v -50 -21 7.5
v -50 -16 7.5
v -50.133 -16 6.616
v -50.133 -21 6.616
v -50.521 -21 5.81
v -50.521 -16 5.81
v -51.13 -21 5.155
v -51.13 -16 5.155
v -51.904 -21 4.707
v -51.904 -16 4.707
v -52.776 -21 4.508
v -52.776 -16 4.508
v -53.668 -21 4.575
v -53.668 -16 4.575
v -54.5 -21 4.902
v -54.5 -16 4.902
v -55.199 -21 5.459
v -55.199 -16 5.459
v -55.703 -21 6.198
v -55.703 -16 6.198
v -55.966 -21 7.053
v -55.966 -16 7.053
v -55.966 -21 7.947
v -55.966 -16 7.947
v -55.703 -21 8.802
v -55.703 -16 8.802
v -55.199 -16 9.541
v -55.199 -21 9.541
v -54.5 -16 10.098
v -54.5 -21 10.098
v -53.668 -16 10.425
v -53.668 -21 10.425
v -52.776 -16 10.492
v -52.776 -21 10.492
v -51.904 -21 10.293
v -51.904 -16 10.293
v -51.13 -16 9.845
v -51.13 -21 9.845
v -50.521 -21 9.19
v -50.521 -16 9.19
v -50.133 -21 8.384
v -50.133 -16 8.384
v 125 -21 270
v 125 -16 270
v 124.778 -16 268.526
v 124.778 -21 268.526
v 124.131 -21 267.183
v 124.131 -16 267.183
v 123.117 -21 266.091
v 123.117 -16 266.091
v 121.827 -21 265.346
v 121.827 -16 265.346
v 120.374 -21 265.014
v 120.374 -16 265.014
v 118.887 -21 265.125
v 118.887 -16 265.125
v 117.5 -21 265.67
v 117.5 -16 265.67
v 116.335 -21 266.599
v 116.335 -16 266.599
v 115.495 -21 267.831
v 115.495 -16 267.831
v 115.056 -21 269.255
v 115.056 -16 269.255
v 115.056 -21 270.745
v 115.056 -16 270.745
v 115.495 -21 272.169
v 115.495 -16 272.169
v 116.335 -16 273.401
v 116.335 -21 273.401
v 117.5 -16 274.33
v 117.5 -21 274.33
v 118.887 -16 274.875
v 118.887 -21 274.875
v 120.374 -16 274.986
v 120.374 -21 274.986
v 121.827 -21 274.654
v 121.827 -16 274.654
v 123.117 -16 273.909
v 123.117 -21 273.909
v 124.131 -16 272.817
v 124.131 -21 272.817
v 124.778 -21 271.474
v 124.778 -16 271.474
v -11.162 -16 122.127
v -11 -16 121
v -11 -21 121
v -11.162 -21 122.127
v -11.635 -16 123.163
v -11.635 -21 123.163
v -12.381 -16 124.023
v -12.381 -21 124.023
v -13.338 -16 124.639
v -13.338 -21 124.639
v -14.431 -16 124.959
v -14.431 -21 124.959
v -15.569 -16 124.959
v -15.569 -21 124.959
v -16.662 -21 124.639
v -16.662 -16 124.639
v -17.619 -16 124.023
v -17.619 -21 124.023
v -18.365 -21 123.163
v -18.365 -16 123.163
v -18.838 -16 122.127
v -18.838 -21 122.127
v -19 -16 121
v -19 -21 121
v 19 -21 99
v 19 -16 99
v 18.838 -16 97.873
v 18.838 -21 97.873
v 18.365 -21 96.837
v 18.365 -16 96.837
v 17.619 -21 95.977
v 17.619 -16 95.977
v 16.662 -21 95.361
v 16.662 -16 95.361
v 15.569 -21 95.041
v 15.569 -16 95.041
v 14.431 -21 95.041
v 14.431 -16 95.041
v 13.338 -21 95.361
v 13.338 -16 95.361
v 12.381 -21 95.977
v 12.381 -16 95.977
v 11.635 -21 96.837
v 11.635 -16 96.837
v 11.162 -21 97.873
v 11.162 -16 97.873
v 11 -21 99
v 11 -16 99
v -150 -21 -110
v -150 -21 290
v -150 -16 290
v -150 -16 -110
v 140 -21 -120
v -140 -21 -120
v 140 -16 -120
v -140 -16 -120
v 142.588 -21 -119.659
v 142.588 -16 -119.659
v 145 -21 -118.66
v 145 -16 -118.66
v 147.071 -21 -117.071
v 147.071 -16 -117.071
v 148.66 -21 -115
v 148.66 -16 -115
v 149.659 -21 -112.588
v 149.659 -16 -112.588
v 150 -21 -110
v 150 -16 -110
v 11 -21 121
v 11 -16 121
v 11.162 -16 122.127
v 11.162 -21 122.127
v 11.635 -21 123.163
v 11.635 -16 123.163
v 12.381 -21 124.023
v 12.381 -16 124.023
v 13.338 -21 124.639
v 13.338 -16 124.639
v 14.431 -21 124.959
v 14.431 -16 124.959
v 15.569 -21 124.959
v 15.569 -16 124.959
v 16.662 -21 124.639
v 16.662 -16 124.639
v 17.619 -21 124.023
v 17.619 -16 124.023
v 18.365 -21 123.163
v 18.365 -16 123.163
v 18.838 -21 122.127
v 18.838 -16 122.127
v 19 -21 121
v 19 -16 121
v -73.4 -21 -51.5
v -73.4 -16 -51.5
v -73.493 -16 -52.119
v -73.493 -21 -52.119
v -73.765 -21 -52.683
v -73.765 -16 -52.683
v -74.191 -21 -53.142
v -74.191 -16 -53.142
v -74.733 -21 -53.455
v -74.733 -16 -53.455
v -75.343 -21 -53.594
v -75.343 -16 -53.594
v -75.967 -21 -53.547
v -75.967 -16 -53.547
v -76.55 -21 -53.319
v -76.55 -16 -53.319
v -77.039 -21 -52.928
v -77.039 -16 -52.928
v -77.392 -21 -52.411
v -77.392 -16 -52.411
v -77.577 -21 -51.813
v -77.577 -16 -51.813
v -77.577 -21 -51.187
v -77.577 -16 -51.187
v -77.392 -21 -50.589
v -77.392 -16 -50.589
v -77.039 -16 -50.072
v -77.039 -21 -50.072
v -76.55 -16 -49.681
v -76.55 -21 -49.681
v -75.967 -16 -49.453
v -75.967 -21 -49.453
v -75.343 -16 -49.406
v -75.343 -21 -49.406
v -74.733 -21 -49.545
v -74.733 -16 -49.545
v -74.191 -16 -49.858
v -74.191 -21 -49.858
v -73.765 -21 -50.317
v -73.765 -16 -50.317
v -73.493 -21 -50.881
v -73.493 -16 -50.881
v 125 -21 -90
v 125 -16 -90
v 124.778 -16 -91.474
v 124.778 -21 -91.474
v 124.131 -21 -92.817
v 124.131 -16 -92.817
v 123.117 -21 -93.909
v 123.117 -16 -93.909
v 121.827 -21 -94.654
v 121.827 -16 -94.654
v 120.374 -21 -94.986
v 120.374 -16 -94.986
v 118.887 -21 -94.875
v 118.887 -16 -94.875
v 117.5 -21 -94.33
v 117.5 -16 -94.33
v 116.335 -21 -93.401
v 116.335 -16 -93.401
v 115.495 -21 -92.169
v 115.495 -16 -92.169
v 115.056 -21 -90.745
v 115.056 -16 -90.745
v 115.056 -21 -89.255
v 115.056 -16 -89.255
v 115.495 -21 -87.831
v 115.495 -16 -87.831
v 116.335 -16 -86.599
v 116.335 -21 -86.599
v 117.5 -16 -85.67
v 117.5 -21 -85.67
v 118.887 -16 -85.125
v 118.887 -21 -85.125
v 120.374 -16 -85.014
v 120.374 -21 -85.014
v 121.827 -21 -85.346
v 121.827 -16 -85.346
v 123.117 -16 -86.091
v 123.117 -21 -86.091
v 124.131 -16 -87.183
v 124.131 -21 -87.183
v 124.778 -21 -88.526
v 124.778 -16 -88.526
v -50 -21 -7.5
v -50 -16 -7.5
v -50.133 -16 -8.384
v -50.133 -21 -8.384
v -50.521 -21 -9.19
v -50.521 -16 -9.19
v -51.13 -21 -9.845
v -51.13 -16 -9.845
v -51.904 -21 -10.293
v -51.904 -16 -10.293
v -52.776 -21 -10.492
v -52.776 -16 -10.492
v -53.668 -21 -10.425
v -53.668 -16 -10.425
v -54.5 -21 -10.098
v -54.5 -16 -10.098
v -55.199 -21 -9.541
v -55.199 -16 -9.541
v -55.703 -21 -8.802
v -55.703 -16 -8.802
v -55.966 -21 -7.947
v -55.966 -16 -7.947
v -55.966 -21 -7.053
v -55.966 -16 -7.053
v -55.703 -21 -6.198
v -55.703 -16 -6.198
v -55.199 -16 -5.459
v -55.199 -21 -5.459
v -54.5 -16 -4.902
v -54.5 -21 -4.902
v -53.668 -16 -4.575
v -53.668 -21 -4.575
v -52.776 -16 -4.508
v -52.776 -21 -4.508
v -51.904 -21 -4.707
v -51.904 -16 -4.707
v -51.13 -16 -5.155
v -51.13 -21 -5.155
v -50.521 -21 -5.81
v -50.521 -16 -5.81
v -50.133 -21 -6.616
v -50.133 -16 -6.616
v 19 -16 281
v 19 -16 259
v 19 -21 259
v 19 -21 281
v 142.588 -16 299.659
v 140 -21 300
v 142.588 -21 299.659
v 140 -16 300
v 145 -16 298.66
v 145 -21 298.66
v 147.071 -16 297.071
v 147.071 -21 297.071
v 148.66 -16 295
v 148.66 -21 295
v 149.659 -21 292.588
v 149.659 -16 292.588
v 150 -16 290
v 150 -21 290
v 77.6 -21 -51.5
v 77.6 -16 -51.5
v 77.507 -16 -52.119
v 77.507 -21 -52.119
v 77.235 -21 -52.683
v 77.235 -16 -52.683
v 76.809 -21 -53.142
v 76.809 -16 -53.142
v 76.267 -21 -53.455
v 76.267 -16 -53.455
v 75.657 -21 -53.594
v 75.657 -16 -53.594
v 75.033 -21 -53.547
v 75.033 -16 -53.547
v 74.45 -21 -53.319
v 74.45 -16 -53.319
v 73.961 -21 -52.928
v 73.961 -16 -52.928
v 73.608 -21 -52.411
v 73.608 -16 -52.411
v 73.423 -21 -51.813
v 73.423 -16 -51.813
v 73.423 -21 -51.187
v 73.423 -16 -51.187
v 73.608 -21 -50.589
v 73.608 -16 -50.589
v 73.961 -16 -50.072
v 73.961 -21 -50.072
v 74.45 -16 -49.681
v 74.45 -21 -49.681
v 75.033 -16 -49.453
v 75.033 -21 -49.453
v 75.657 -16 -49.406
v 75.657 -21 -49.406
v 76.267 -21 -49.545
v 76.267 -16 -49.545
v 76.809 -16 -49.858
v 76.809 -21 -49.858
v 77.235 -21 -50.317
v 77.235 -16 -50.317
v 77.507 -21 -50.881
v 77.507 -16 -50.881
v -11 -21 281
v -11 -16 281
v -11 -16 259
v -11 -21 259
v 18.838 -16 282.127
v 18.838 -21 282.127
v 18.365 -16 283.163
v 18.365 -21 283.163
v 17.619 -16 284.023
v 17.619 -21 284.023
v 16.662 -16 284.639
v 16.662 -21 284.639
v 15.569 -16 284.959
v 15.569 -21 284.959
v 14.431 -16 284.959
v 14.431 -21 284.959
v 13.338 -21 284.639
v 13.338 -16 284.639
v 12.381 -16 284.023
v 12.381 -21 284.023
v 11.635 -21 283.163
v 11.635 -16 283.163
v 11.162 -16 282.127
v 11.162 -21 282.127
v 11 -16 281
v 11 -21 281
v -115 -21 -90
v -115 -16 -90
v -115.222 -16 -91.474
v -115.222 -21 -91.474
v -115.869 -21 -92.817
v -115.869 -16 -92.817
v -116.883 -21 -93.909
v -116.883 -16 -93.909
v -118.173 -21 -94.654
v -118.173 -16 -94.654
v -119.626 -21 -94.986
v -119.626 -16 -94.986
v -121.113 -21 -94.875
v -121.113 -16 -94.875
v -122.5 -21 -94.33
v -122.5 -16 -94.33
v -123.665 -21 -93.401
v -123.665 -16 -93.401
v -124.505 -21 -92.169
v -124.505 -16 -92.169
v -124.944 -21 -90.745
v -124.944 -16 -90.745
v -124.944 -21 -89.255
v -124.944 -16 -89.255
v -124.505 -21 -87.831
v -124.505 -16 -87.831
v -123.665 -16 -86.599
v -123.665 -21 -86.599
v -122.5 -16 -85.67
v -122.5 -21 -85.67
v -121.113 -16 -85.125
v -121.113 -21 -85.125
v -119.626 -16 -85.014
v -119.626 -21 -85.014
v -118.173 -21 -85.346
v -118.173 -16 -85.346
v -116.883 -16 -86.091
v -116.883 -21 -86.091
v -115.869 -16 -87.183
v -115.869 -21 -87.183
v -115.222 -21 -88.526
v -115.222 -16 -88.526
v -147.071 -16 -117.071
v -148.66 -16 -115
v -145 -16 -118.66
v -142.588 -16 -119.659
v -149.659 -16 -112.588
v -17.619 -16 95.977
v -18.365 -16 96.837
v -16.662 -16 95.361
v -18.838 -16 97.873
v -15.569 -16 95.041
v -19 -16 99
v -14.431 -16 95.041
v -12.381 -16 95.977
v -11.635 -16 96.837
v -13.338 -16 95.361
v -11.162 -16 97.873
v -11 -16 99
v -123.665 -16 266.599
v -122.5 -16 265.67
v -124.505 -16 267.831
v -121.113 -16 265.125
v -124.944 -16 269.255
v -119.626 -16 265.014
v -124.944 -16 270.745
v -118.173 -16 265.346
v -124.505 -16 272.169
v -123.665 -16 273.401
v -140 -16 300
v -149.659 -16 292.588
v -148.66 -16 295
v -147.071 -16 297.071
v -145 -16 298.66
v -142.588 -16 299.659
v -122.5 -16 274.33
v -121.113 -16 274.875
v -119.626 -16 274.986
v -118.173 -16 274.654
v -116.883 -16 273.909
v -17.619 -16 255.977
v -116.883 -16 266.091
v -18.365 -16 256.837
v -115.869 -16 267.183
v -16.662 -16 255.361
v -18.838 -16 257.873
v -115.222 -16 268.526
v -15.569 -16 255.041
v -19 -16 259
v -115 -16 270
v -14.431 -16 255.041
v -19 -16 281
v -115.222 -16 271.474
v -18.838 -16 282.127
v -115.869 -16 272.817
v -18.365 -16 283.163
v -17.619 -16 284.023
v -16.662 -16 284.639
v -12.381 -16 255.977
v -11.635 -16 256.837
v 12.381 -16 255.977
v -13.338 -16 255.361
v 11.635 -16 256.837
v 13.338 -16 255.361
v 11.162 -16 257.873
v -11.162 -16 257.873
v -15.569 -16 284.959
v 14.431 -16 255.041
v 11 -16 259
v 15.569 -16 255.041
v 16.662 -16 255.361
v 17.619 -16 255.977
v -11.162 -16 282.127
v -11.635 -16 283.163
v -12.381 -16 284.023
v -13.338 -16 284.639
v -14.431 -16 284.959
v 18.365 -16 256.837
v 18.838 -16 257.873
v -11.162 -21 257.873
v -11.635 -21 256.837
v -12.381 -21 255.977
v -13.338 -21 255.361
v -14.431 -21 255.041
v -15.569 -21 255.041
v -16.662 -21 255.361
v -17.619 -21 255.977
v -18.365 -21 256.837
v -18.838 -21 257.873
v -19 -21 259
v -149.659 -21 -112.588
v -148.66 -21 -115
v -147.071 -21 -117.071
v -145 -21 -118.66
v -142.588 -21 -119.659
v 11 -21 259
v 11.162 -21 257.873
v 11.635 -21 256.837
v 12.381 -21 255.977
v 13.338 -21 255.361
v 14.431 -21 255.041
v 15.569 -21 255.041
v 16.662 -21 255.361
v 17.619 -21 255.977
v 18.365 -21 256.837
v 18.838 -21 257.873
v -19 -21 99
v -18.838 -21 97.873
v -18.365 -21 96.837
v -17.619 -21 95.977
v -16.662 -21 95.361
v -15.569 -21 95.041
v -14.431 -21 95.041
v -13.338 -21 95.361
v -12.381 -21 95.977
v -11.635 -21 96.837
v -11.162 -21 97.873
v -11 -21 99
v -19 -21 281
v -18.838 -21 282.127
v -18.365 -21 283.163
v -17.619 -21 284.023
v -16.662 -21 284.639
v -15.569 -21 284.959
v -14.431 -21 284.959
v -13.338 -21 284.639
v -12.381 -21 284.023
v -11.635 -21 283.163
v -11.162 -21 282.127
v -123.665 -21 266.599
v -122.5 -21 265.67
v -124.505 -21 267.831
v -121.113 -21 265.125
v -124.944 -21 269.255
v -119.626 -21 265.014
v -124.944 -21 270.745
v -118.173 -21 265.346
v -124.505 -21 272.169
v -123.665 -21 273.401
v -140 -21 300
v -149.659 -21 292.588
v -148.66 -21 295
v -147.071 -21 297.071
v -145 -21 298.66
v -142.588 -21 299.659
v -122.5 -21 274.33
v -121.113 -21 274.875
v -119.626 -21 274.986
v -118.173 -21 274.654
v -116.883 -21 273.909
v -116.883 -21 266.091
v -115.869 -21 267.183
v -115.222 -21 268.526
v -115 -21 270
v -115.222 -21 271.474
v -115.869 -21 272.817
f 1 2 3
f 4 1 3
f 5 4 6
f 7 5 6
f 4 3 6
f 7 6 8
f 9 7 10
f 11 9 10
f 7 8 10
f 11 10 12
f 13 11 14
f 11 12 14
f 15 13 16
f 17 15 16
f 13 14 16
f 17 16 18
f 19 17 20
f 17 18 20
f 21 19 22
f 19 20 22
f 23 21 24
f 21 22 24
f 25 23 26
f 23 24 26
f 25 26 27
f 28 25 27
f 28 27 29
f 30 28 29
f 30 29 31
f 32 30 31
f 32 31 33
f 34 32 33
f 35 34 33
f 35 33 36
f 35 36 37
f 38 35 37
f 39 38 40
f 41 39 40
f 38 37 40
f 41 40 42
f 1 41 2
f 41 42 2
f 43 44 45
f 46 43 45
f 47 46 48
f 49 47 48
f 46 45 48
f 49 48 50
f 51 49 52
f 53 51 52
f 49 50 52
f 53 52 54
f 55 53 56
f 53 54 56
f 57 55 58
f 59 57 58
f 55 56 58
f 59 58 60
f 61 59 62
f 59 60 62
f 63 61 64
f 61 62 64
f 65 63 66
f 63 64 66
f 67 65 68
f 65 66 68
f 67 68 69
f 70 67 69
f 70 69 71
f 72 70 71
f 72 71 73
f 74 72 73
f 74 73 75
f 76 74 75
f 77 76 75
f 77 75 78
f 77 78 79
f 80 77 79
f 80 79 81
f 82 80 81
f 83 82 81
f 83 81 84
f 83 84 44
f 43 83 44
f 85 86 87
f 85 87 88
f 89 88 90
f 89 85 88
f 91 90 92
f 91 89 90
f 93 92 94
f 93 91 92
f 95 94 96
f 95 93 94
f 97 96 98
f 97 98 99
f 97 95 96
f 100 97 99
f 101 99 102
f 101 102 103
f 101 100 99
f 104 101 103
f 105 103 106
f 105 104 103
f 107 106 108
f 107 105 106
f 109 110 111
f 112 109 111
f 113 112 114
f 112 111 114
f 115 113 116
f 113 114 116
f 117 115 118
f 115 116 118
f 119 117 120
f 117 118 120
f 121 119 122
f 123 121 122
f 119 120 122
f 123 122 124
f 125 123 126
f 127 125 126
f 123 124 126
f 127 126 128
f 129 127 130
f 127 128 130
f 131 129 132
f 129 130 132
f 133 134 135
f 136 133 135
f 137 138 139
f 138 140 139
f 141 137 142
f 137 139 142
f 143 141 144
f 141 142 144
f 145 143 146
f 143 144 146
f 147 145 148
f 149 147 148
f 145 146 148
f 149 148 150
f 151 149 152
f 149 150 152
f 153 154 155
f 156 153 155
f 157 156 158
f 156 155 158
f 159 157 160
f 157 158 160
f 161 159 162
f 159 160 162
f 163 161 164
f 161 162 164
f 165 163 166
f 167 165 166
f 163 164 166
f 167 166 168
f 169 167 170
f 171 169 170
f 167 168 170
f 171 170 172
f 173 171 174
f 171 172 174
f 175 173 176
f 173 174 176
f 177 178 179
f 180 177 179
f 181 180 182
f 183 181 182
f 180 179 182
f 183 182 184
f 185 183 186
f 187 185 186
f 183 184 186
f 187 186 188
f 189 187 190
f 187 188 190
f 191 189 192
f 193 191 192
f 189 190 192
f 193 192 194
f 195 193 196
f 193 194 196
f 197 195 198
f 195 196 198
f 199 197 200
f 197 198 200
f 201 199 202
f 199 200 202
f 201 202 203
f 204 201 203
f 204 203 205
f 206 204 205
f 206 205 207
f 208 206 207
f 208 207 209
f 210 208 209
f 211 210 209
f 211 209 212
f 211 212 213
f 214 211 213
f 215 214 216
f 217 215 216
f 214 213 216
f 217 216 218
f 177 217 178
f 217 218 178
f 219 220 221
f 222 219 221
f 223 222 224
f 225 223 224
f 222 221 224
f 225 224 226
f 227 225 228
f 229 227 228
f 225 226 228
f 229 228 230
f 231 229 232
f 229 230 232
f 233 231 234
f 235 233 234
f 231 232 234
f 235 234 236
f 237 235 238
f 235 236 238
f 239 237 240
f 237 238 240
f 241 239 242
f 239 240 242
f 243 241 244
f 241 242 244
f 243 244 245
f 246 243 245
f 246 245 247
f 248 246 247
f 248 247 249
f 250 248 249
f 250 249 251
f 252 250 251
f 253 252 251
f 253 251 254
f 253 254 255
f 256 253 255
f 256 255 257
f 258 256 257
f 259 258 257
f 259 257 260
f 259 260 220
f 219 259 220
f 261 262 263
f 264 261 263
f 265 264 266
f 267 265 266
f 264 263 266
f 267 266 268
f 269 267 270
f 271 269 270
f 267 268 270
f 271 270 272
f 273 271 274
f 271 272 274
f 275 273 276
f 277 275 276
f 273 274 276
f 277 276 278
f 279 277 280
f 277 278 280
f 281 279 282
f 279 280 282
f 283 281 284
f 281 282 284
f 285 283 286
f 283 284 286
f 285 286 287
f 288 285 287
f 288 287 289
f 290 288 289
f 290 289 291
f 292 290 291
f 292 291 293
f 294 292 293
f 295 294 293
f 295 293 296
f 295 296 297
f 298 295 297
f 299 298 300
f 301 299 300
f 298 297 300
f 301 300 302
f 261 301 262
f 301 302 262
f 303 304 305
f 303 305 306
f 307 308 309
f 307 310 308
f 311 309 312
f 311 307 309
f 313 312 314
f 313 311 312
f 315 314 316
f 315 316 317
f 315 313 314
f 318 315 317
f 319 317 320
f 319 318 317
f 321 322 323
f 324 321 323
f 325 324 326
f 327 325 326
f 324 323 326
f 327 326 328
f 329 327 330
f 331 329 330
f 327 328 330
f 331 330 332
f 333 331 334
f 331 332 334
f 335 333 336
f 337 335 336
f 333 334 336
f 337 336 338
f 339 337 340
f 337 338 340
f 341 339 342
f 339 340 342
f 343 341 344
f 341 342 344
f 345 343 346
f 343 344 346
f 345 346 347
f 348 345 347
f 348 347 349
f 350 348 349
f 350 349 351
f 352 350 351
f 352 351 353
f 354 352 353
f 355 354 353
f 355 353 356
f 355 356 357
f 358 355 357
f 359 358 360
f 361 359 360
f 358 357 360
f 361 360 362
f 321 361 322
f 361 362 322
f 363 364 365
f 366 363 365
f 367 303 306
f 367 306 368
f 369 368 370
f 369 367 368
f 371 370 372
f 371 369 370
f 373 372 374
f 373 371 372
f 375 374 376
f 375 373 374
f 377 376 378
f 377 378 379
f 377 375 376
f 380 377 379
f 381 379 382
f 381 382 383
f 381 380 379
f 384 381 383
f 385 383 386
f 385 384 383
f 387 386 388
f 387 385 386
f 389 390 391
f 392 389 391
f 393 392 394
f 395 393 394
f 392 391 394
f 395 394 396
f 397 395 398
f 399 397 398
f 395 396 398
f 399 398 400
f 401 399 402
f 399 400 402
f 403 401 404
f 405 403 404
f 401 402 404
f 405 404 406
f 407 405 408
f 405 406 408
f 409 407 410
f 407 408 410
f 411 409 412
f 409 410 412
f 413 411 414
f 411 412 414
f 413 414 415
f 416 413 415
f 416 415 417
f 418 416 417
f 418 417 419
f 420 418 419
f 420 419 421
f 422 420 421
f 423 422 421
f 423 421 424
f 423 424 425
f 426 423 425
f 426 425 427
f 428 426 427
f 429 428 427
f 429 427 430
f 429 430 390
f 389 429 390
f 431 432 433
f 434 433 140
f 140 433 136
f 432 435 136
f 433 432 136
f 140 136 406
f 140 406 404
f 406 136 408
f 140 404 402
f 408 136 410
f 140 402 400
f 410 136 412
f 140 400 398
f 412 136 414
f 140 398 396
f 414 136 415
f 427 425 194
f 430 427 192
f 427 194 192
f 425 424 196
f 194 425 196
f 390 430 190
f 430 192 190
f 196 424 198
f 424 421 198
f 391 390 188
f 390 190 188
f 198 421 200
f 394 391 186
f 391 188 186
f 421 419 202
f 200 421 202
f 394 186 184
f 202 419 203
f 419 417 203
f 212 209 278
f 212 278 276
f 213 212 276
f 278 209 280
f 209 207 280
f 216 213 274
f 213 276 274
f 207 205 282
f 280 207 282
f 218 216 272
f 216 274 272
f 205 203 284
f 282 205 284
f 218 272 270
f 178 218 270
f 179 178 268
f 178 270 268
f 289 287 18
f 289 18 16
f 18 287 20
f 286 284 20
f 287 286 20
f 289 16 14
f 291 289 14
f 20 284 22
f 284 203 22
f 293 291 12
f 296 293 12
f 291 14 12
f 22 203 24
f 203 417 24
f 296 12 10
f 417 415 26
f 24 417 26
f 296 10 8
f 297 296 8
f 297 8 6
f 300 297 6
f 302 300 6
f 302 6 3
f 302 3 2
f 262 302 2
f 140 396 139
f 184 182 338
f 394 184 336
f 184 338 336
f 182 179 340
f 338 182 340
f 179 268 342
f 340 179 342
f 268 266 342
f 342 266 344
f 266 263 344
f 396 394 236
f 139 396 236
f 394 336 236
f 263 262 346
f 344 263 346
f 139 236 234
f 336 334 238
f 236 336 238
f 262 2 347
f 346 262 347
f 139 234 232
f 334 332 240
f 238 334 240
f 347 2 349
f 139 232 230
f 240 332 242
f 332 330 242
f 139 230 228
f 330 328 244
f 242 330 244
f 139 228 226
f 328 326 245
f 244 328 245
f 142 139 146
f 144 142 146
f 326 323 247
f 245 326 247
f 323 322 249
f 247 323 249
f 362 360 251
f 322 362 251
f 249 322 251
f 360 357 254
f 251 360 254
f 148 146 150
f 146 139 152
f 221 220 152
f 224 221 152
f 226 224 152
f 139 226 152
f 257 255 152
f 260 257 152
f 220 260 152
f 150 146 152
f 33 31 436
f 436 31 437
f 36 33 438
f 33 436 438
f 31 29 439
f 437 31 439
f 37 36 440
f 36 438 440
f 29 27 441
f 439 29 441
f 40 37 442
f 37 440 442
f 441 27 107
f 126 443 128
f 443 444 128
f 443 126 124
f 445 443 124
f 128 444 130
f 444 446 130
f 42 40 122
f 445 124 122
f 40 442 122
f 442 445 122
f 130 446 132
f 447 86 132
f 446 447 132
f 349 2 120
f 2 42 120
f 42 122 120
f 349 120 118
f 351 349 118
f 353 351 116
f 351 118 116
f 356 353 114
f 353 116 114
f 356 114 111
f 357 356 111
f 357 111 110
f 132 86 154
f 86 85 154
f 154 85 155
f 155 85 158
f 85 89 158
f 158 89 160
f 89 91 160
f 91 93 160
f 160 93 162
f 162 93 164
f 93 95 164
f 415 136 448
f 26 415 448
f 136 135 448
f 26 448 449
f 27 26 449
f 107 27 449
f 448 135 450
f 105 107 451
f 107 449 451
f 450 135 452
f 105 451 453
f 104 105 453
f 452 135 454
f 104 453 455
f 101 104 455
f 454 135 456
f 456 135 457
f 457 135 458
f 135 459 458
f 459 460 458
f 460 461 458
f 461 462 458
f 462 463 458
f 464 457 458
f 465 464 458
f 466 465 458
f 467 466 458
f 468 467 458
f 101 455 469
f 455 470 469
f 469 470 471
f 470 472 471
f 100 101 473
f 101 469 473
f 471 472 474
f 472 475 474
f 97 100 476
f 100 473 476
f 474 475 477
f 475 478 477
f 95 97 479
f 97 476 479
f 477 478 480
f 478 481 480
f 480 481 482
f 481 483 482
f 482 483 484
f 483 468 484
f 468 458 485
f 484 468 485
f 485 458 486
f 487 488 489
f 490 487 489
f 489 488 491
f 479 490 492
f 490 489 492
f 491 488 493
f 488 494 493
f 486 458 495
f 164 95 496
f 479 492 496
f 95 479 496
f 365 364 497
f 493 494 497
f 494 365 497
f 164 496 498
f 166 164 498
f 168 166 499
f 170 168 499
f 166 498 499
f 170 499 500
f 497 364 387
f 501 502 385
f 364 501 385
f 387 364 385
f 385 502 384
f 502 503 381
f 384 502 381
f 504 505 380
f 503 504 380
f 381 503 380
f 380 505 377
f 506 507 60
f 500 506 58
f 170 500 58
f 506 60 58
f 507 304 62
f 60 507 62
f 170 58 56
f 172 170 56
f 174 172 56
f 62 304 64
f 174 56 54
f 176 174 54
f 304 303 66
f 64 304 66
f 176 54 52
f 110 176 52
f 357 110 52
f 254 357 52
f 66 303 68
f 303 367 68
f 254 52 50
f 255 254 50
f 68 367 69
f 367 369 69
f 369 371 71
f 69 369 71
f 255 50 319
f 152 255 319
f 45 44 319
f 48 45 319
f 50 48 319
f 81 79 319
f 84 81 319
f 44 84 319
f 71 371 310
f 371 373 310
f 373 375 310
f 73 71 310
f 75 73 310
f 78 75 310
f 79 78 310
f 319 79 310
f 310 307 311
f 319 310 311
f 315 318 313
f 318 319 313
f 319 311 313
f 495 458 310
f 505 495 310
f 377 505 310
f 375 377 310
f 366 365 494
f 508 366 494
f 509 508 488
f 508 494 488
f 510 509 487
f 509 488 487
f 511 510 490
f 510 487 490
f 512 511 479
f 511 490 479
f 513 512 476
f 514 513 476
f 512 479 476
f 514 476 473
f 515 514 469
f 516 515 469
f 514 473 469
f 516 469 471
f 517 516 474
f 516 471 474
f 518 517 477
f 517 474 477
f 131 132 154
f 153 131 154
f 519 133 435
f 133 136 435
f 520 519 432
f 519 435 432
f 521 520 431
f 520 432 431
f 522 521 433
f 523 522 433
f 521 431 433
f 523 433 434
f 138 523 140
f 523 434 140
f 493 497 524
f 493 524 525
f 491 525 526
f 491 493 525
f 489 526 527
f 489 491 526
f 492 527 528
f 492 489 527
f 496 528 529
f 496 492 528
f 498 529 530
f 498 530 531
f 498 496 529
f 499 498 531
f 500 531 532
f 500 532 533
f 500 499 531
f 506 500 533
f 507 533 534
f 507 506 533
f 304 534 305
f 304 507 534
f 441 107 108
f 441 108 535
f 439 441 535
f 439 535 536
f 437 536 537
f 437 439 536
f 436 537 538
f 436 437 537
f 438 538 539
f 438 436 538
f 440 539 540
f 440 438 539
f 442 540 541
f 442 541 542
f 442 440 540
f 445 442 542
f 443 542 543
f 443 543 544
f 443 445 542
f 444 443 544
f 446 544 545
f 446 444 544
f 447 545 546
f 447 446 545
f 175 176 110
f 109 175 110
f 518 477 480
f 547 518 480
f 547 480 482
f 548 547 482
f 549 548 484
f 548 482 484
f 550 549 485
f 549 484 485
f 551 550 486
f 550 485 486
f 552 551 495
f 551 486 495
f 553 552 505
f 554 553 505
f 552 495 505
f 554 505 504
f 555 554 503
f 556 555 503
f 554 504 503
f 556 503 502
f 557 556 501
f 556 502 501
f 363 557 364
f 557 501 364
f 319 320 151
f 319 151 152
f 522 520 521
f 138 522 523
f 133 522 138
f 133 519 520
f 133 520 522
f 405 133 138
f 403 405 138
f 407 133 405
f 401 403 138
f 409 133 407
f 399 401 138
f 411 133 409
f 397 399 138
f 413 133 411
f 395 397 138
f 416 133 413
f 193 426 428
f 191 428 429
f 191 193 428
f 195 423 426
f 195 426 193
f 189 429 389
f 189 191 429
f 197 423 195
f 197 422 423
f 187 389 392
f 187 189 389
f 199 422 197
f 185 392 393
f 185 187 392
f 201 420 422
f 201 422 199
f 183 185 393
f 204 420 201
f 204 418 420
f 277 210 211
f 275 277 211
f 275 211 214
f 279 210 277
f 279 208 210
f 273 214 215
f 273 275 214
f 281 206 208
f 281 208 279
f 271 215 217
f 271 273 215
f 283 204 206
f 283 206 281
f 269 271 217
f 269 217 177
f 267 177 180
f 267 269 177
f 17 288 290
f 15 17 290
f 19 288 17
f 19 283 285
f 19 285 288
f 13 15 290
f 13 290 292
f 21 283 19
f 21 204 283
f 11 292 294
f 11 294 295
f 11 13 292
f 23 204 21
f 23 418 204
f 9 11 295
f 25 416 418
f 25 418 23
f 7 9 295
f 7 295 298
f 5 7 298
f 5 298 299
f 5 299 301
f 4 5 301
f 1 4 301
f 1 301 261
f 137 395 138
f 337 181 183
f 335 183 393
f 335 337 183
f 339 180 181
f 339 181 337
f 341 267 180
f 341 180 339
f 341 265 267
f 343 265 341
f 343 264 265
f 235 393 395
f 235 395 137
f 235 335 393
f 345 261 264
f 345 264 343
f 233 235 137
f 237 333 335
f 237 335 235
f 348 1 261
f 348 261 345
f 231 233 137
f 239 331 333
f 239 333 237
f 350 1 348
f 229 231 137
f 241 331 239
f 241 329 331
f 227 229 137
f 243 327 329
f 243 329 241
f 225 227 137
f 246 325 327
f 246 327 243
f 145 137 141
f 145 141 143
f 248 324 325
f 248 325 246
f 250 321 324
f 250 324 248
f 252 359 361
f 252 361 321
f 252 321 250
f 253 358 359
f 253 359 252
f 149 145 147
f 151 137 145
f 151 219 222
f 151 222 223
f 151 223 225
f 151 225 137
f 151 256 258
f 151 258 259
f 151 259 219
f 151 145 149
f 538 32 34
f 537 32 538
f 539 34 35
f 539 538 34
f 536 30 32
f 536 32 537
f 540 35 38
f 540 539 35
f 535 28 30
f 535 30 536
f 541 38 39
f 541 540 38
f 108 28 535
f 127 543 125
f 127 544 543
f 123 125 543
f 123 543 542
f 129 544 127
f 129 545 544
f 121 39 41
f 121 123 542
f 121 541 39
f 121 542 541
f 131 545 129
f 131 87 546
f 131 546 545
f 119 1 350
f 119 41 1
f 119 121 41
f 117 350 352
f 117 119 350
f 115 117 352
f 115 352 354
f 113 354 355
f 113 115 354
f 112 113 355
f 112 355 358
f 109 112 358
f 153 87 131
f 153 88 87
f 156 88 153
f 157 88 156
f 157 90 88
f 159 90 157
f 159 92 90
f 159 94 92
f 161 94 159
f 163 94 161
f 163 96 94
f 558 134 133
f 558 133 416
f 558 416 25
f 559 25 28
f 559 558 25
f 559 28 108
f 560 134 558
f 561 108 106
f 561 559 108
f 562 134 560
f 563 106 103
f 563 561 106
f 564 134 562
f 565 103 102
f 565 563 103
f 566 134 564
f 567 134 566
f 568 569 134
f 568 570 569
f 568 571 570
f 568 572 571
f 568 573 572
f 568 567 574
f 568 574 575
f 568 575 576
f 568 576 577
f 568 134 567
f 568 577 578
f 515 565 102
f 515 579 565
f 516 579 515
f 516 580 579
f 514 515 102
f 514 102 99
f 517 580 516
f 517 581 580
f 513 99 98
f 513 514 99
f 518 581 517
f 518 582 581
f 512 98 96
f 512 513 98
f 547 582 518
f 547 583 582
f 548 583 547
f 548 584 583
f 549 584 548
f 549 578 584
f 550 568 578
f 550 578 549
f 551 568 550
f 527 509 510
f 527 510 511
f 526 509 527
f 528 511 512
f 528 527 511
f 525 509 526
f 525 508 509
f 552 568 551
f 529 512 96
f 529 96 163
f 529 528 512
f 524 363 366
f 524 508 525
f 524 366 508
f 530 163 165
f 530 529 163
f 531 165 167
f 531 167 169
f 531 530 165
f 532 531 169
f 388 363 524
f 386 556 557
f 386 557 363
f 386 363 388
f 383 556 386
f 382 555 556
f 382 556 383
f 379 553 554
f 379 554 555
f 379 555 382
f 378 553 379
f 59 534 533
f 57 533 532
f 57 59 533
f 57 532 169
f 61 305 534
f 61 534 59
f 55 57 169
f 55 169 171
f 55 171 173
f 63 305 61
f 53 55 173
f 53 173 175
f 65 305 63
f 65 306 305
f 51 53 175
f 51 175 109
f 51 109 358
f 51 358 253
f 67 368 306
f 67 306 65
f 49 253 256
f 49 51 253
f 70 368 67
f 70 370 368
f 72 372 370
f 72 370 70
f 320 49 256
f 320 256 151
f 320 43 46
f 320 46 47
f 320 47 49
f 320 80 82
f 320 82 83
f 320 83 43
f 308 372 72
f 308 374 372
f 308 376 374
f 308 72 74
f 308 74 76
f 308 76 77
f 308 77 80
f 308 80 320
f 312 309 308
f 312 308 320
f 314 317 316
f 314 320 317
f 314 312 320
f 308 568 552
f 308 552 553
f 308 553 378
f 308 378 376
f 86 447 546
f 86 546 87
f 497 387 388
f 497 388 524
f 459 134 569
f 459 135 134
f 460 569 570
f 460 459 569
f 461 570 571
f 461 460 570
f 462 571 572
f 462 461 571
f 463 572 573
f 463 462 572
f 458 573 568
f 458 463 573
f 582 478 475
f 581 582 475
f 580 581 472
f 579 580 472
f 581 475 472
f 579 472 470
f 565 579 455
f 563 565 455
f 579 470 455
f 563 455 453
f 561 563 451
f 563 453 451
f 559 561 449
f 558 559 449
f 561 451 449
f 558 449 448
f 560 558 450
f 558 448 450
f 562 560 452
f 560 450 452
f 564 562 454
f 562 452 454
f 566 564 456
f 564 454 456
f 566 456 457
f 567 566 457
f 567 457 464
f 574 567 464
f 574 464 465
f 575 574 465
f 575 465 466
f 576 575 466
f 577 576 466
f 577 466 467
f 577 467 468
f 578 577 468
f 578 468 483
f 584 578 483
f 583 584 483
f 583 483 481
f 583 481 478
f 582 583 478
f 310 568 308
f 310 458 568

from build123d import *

# Parameters (mm, degrees)
SKIZZE2_W                            = 300
SKIZZE2_H                            = 5
AUFSATZ_LINEAR_AUSTRAGEN1_DEPTH      = 300
AUFSATZ_LINEAR_AUSTRAGEN1_DEPTH_BACK = 120
SCHNITT_LINEAR_AUSTRAGEN1_DEPTH      = 5
SKIZZE6_R                            = 3
SCHNITT_LINEAR_AUSTRAGEN2_DEPTH      = 5
SKIZZE8_R                            = 5
SCHNITT_LINEAR_AUSTRAGEN3_DEPTH      = 21
VERRUNDUNG1_R                        = 10
SKIZZE9_R                            = 2.1
SCHNITT_LINEAR_AUSTRAGEN4_DEPTH      = 5


with BuildPart() as part:
    # Skizze2 → Aufsatz-Linear austragen1 (new body, two sides)
    with BuildSketch(Plane.XY) as aufsatz_linear_austragen1_sk:
        with Locations((0, -18.5)):
            Rectangle(SKIZZE2_W, SKIZZE2_H)
    extrude(amount=AUFSATZ_LINEAR_AUSTRAGEN1_DEPTH)
    extrude(aufsatz_linear_austragen1_sk.sketch, amount=-AUFSATZ_LINEAR_AUSTRAGEN1_DEPTH_BACK)

    # Skizze4 → Schnitt-Linear austragen1 (cut)
    with BuildSketch(Plane(origin=(0, -16, 0), x_dir=(1, 0, 0), z_dir=(0, 1, 0))):
        with BuildLine():
            Line((-19, -121), (-19, -99))
            ThreePointArc((-19, -99), (-15, -95), (-11, -99))
            Line((-11, -99), (-11, -121))
            ThreePointArc((-11, -121), (-15, -125), (-19, -121))
        make_face()
        with BuildLine():
            Line((19, -121), (19, -99))
            ThreePointArc((19, -99), (15, -95), (11, -99))
            Line((11, -99), (11, -121))
            ThreePointArc((11, -121), (15, -125), (19, -121))
        make_face()
        with BuildLine():
            Line((-19, -259), (-19, -281))
            ThreePointArc((-19, -281), (-15, -285), (-11, -281))
            Line((-11, -281), (-11, -259))
            ThreePointArc((-11, -259), (-15, -255), (-19, -259))
        make_face()
        with BuildLine():
            Line((19, -259), (19, -281))
            ThreePointArc((19, -281), (15, -285), (11, -281))
            Line((11, -281), (11, -259))
            ThreePointArc((11, -259), (15, -255), (19, -259))
        make_face()
    extrude(amount=-SCHNITT_LINEAR_AUSTRAGEN1_DEPTH, mode=Mode.SUBTRACT)

    # Skizze6 → Schnitt-Linear austragen2 (cut)
    with BuildSketch(Plane(origin=(0, -16, 0), x_dir=(1, 0, 0), z_dir=(0, 1, 0))):
        with Locations((-53, 7.5)):
            Circle(SKIZZE6_R)
        with Locations((-53, -7.5)):
            Circle(SKIZZE6_R)
    extrude(amount=-SCHNITT_LINEAR_AUSTRAGEN2_DEPTH, mode=Mode.SUBTRACT)

    # Skizze8 → Schnitt-Linear austragen3 (cut)
    with BuildSketch(Plane(origin=(0, 0, 0), x_dir=(1, 0, 0), z_dir=(0, 1, 0))):
        with Locations((-120, 90)):
            Circle(SKIZZE8_R)
        with Locations((120, 90)):
            Circle(SKIZZE8_R)
        with Locations((120, -270)):
            Circle(SKIZZE8_R)
        with Locations((-120, -270)):
            Circle(SKIZZE8_R)
    extrude(amount=-SCHNITT_LINEAR_AUSTRAGEN3_DEPTH, mode=Mode.SUBTRACT)

    # Verrundung1
    verrundung1_edges = [part.edges().sort_by_distance(p)[0] for p in [
        (-150, -18.5, -120),
        (150, -18.5, -120),
        (150, -18.5, 300),
        (-150, -18.5, 300),
    ]]
    fillet(verrundung1_edges, radius=VERRUNDUNG1_R)

    # Skizze9 → Schnitt-Linear austragen4 (cut)
    with BuildSketch(Plane(origin=(0, -16, 0), x_dir=(1, 0, 0), z_dir=(0, 1, 0))):
        with Locations((75.5, 51.5)):
            Circle(SKIZZE9_R)
        with Locations((-75.5, 51.5)):
            Circle(SKIZZE9_R)
    extrude(amount=-SCHNITT_LINEAR_AUSTRAGEN4_DEPTH, mode=Mode.SUBTRACT)


solid = part.part
